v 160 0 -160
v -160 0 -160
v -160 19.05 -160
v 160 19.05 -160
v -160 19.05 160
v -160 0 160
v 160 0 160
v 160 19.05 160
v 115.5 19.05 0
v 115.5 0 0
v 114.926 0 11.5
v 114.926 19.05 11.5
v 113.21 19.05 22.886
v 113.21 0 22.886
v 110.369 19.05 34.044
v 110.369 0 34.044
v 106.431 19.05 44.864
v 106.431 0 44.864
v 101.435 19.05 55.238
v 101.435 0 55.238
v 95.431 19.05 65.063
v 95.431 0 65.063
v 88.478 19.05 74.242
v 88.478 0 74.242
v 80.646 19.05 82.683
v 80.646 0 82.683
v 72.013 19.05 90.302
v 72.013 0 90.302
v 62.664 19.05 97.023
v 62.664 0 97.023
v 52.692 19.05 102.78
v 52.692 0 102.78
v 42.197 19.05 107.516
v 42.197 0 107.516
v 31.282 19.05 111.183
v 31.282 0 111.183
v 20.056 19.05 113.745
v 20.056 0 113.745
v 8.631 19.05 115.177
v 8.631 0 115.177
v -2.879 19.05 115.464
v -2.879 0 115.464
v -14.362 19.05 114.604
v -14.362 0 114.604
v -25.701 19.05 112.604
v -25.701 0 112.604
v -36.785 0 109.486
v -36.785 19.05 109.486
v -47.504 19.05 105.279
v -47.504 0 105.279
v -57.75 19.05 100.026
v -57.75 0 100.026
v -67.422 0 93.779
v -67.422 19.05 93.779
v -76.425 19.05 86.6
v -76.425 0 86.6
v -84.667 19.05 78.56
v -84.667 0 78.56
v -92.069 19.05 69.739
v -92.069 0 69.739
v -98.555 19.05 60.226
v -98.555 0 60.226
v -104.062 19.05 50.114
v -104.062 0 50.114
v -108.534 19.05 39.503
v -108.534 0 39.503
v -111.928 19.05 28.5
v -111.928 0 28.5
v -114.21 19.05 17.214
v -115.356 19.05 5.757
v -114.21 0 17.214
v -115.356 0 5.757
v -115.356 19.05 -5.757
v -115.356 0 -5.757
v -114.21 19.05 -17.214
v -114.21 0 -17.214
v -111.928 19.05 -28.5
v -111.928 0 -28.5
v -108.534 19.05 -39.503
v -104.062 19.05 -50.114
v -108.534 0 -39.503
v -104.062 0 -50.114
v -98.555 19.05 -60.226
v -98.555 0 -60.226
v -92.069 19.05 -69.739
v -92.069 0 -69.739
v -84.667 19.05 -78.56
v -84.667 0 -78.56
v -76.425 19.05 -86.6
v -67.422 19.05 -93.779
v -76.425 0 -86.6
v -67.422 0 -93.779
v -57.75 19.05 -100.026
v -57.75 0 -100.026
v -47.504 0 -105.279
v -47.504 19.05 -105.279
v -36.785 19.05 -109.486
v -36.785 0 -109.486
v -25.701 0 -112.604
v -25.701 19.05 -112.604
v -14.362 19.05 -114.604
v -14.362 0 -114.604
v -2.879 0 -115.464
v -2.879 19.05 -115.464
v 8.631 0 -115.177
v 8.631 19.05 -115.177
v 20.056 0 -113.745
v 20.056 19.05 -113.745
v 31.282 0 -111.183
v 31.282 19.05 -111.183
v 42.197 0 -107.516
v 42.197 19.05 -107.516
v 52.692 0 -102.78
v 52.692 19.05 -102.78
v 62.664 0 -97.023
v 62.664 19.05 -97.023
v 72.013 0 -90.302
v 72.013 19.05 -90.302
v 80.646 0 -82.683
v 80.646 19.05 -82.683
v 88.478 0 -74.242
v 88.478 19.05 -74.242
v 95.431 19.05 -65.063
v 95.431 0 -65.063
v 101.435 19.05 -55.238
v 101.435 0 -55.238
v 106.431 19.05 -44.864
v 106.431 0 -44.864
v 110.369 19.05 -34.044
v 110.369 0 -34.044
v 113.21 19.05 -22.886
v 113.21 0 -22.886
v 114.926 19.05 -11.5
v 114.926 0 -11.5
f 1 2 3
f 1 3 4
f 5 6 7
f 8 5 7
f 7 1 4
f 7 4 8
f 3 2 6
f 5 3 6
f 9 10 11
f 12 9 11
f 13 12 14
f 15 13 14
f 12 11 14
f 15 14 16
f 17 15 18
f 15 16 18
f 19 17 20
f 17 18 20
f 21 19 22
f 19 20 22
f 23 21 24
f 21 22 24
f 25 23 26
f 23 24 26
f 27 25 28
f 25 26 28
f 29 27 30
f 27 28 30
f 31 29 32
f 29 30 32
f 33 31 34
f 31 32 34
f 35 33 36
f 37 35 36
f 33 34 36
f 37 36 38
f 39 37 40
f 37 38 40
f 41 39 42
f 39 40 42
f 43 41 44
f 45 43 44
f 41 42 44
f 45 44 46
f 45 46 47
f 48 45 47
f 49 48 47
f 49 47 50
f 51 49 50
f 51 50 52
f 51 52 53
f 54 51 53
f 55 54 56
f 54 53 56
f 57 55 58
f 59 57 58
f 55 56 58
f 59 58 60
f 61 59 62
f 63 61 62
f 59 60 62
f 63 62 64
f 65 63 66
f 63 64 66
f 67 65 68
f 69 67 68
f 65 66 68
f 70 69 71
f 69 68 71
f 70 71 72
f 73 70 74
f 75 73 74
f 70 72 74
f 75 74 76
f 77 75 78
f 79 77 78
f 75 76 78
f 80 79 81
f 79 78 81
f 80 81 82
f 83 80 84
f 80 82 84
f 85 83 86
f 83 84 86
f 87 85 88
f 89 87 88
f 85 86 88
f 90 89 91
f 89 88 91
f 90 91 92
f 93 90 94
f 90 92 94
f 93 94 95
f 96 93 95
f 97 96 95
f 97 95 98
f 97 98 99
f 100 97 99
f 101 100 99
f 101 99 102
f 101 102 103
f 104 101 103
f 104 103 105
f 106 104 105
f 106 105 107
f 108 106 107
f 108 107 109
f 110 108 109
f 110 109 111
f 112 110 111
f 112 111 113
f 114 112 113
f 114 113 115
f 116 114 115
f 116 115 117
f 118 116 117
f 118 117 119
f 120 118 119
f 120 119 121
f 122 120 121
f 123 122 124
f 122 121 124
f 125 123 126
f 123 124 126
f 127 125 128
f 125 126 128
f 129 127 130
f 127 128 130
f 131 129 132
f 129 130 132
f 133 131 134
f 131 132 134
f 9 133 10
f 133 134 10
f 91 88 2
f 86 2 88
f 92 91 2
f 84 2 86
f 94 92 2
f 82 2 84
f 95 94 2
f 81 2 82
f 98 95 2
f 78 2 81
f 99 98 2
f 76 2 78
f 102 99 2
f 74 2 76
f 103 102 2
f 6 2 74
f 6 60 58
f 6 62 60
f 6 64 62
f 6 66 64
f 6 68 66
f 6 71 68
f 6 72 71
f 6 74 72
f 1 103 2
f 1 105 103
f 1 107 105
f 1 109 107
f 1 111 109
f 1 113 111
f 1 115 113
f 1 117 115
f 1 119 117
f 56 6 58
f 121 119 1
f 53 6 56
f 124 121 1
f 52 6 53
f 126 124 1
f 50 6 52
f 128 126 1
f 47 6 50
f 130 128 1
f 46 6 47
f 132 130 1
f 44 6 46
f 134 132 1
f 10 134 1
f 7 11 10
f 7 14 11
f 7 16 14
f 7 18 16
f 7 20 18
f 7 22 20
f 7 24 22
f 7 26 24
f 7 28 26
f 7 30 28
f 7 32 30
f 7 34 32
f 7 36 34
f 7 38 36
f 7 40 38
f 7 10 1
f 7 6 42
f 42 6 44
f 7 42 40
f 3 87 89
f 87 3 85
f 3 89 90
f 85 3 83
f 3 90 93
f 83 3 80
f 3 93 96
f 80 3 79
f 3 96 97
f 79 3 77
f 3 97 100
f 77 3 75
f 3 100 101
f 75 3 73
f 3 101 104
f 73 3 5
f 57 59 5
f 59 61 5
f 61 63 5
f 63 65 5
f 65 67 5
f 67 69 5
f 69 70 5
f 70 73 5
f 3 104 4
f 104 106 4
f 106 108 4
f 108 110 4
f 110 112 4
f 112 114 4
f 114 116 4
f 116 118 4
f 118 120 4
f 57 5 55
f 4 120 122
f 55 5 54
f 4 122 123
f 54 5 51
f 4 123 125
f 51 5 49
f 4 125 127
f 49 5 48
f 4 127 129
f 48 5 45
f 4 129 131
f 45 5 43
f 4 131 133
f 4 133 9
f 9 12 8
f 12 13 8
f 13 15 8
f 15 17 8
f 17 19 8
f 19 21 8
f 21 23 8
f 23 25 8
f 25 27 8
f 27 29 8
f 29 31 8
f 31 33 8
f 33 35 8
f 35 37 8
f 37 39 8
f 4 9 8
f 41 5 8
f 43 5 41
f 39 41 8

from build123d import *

# Parameters (mm, degrees)
F0_W     = 320
F0_H     = 320
F0_R     = 115.5
F1_DEPTH = 19.05


with BuildPart() as f1:
    # F0 (on Front) → F1 (new body)
    with BuildSketch(Plane.XZ):
        Rectangle(F0_W, F0_H)
        Circle(F0_R, mode=Mode.SUBTRACT)
    extrude(amount=-F1_DEPTH)


solid = f1.part
